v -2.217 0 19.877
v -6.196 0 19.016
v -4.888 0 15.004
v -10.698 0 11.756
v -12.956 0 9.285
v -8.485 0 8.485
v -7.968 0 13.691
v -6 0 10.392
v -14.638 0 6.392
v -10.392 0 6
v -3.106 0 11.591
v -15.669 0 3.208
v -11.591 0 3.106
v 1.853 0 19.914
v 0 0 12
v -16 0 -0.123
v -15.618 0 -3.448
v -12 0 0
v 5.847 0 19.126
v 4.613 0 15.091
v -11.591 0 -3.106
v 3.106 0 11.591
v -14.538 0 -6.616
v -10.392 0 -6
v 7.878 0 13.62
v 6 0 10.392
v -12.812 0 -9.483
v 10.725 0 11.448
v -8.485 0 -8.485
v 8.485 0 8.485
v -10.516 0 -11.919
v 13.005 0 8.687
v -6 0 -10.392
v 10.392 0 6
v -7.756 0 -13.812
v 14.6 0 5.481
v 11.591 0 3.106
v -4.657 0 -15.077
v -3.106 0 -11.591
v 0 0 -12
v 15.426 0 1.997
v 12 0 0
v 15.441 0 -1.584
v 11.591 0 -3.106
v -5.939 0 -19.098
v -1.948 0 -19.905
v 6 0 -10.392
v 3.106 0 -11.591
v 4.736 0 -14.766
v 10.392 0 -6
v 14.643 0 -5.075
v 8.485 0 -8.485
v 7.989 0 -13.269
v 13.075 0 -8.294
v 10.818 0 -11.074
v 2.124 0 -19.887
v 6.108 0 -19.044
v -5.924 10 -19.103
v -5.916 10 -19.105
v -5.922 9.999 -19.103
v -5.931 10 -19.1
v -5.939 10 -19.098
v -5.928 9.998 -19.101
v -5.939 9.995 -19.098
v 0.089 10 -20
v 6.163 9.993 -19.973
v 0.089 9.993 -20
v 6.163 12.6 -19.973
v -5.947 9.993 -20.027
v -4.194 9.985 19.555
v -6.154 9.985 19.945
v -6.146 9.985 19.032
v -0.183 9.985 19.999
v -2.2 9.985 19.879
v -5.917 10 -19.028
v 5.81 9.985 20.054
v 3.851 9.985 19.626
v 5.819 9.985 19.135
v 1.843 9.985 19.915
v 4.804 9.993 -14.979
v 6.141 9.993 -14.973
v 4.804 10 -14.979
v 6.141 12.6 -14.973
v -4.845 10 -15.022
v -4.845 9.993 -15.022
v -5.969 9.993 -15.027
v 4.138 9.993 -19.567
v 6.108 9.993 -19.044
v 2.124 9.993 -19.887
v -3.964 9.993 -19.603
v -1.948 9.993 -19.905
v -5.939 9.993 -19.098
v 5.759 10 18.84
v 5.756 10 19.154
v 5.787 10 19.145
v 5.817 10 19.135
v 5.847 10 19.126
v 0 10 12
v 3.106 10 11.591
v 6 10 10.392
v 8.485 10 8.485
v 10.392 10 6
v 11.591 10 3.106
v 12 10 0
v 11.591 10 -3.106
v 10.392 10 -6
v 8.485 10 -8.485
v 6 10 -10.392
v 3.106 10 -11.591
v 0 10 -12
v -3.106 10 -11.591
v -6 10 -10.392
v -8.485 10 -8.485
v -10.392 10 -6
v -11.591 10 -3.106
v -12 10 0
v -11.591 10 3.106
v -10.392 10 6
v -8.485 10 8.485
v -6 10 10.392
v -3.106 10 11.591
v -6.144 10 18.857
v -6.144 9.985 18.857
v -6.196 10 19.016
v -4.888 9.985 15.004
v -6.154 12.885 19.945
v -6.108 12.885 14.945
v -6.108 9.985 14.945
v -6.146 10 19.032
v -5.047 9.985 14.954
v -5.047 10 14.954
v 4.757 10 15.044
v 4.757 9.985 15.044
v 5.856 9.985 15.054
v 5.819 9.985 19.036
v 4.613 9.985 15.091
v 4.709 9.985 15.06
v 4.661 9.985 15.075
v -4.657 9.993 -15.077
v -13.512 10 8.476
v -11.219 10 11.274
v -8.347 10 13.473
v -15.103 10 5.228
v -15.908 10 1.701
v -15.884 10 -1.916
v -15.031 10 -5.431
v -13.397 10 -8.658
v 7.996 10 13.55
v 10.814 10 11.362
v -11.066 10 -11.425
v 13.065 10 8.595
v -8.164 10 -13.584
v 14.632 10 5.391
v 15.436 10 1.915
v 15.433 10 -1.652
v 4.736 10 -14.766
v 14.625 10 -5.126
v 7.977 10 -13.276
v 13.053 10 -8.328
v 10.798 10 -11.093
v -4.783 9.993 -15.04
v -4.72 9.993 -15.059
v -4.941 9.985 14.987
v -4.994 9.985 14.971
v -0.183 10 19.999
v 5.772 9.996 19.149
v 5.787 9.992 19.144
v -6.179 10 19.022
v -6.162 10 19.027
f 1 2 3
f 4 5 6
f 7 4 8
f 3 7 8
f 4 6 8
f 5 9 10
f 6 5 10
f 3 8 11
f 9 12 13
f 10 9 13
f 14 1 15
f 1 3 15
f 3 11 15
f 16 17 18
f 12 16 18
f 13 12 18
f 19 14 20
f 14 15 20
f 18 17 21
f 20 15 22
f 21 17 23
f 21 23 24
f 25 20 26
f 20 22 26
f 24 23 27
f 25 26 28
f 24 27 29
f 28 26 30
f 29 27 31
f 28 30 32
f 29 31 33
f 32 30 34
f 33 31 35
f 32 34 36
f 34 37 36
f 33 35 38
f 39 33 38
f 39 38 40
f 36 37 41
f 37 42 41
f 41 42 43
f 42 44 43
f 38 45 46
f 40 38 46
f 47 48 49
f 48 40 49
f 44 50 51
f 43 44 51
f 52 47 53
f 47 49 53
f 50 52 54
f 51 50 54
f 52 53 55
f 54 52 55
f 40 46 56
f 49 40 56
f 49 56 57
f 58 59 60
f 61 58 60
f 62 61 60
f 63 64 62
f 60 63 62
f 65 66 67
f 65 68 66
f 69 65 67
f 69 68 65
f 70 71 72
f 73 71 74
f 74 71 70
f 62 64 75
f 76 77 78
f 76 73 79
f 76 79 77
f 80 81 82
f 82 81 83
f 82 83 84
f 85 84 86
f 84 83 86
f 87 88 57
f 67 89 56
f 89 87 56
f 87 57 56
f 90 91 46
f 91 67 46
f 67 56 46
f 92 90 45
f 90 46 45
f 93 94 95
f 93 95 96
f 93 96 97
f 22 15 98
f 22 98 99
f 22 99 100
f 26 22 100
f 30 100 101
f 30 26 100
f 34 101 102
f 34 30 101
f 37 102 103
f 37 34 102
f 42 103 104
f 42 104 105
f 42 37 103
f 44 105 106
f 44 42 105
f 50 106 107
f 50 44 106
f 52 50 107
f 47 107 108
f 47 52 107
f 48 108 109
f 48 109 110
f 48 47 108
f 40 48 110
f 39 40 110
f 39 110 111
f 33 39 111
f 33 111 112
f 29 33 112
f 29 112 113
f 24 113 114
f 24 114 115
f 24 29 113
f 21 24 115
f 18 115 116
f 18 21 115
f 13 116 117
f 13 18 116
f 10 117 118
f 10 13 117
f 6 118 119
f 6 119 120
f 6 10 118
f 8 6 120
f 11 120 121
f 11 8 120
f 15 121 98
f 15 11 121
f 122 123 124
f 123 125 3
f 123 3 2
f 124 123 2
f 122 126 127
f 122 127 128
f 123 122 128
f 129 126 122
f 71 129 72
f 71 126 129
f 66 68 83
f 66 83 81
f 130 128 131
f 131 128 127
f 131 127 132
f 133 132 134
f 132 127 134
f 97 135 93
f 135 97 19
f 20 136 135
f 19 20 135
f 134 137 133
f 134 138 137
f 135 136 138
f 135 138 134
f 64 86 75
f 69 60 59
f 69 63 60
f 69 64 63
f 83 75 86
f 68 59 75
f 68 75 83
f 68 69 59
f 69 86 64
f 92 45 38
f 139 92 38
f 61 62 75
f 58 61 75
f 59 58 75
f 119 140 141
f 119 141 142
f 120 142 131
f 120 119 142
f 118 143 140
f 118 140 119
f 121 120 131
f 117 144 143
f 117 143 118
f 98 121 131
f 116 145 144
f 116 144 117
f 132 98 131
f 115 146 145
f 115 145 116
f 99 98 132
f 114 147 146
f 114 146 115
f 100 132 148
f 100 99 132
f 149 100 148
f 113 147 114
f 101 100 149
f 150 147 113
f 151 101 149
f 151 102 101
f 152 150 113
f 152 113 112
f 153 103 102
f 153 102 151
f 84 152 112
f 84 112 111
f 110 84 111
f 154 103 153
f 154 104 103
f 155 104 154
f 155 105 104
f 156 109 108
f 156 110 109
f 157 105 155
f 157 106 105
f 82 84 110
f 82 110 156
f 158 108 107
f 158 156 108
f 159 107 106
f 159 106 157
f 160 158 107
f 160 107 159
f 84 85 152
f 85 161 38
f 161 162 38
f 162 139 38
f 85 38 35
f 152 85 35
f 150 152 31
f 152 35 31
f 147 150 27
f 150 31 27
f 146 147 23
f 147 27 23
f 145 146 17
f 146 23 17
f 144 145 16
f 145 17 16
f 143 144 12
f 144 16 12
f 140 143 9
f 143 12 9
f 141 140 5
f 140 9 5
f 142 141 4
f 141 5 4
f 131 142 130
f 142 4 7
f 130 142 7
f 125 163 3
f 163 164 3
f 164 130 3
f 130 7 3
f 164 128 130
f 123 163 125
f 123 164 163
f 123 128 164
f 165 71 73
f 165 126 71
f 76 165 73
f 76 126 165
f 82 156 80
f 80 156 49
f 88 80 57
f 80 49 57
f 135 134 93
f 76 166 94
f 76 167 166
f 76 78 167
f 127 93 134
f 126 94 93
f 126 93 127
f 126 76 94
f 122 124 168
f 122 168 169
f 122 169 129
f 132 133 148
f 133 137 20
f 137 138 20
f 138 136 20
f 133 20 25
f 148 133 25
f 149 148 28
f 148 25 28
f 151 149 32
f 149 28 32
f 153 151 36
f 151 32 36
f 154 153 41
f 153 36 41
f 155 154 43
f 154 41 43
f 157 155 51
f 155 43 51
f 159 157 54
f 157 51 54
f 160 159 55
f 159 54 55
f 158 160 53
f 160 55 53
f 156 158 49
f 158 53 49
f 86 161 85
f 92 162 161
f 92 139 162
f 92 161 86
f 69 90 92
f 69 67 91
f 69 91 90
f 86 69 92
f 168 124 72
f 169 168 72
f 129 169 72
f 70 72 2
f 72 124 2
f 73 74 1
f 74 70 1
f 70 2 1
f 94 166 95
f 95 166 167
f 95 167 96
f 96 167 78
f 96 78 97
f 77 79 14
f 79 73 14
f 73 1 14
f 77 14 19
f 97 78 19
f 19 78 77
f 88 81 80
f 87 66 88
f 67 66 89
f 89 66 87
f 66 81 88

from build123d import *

# Parameters (mm, degrees)
SKETCH1_R           = 12
BOSS_EXTRUDE1_DEPTH = 10
BOSS_EXTRUDE2_DEPTH = 5
BOSS_EXTRUDE3_DEPTH = 5


with BuildPart() as part:
    # Sketch1 → Boss-Extrude1 (new body)
    with BuildSketch(Plane(origin=(0, 0, 0), x_dir=(1, 0, 0), z_dir=(0, 1, 0))):
        with BuildLine():
            Line((-5.938922448, 19.097884704), (-4.65723572, 15.077087101))
            ThreePointArc((-4.65723572, 15.077087101), (-16.000205846, 0.123004291), (-4.888486885, -15.003702742))
            Line((-4.888486885, -15.003702742), (-6.195800868, -19.0160998))
            ThreePointArc((-6.195800868, -19.0160998), (-0.182924717, -19.999163446), (5.846927348, -19.12625004))
            Line((5.846927348, -19.12625004), (4.613225677, -15.090611282))
            ThreePointArc((4.613225677, -15.090611282), (15.53596231, -0.206998546), (4.736250871, 14.766121919))
            Line((4.736250871, 14.766121919), (6.108489826, 19.04432598))
            ThreePointArc((6.108489826, 19.04432598), (0.088912362, 19.999802364), (-5.938922448, 19.097884704))
        make_face()
        with Locations(Location((0, 0, 0), (0, 0, 270))):
            Circle(SKETCH1_R, mode=Mode.SUBTRACT)
    extrude(amount=BOSS_EXTRUDE1_DEPTH)

    # Sketch2 → Boss-Extrude2 (add)
    with BuildSketch(Plane(origin=(-0.182924717, 10, 19.999163446), x_dir=(0.9999581723101434, 0, 0.009146235846386387), z_dir=(-0.009146235846386385, 0, 0.9999581723101433))):
        Polygon((-5.97117687, -0.015009165), (5.99330158, -0.015009165), (-5.97117687, 2.885349138), align=None)
    extrude(amount=-BOSS_EXTRUDE2_DEPTH)

    # Sketch3 → Boss-Extrude3 (add)
    with BuildSketch(Plane(origin=(0.088912362, 10, -19.999802364), x_dir=(-0.9999901181910447, 0, -0.004445618096607563), z_dir=(0.004445618096607563, 0, -0.9999901181910447))):
        Polygon((-6.073960735, -0.007479705), (6.036027913, -0.007479705), (-6.073960735, 2.600191919), align=None)
    extrude(amount=-BOSS_EXTRUDE3_DEPTH)


solid = part.part
